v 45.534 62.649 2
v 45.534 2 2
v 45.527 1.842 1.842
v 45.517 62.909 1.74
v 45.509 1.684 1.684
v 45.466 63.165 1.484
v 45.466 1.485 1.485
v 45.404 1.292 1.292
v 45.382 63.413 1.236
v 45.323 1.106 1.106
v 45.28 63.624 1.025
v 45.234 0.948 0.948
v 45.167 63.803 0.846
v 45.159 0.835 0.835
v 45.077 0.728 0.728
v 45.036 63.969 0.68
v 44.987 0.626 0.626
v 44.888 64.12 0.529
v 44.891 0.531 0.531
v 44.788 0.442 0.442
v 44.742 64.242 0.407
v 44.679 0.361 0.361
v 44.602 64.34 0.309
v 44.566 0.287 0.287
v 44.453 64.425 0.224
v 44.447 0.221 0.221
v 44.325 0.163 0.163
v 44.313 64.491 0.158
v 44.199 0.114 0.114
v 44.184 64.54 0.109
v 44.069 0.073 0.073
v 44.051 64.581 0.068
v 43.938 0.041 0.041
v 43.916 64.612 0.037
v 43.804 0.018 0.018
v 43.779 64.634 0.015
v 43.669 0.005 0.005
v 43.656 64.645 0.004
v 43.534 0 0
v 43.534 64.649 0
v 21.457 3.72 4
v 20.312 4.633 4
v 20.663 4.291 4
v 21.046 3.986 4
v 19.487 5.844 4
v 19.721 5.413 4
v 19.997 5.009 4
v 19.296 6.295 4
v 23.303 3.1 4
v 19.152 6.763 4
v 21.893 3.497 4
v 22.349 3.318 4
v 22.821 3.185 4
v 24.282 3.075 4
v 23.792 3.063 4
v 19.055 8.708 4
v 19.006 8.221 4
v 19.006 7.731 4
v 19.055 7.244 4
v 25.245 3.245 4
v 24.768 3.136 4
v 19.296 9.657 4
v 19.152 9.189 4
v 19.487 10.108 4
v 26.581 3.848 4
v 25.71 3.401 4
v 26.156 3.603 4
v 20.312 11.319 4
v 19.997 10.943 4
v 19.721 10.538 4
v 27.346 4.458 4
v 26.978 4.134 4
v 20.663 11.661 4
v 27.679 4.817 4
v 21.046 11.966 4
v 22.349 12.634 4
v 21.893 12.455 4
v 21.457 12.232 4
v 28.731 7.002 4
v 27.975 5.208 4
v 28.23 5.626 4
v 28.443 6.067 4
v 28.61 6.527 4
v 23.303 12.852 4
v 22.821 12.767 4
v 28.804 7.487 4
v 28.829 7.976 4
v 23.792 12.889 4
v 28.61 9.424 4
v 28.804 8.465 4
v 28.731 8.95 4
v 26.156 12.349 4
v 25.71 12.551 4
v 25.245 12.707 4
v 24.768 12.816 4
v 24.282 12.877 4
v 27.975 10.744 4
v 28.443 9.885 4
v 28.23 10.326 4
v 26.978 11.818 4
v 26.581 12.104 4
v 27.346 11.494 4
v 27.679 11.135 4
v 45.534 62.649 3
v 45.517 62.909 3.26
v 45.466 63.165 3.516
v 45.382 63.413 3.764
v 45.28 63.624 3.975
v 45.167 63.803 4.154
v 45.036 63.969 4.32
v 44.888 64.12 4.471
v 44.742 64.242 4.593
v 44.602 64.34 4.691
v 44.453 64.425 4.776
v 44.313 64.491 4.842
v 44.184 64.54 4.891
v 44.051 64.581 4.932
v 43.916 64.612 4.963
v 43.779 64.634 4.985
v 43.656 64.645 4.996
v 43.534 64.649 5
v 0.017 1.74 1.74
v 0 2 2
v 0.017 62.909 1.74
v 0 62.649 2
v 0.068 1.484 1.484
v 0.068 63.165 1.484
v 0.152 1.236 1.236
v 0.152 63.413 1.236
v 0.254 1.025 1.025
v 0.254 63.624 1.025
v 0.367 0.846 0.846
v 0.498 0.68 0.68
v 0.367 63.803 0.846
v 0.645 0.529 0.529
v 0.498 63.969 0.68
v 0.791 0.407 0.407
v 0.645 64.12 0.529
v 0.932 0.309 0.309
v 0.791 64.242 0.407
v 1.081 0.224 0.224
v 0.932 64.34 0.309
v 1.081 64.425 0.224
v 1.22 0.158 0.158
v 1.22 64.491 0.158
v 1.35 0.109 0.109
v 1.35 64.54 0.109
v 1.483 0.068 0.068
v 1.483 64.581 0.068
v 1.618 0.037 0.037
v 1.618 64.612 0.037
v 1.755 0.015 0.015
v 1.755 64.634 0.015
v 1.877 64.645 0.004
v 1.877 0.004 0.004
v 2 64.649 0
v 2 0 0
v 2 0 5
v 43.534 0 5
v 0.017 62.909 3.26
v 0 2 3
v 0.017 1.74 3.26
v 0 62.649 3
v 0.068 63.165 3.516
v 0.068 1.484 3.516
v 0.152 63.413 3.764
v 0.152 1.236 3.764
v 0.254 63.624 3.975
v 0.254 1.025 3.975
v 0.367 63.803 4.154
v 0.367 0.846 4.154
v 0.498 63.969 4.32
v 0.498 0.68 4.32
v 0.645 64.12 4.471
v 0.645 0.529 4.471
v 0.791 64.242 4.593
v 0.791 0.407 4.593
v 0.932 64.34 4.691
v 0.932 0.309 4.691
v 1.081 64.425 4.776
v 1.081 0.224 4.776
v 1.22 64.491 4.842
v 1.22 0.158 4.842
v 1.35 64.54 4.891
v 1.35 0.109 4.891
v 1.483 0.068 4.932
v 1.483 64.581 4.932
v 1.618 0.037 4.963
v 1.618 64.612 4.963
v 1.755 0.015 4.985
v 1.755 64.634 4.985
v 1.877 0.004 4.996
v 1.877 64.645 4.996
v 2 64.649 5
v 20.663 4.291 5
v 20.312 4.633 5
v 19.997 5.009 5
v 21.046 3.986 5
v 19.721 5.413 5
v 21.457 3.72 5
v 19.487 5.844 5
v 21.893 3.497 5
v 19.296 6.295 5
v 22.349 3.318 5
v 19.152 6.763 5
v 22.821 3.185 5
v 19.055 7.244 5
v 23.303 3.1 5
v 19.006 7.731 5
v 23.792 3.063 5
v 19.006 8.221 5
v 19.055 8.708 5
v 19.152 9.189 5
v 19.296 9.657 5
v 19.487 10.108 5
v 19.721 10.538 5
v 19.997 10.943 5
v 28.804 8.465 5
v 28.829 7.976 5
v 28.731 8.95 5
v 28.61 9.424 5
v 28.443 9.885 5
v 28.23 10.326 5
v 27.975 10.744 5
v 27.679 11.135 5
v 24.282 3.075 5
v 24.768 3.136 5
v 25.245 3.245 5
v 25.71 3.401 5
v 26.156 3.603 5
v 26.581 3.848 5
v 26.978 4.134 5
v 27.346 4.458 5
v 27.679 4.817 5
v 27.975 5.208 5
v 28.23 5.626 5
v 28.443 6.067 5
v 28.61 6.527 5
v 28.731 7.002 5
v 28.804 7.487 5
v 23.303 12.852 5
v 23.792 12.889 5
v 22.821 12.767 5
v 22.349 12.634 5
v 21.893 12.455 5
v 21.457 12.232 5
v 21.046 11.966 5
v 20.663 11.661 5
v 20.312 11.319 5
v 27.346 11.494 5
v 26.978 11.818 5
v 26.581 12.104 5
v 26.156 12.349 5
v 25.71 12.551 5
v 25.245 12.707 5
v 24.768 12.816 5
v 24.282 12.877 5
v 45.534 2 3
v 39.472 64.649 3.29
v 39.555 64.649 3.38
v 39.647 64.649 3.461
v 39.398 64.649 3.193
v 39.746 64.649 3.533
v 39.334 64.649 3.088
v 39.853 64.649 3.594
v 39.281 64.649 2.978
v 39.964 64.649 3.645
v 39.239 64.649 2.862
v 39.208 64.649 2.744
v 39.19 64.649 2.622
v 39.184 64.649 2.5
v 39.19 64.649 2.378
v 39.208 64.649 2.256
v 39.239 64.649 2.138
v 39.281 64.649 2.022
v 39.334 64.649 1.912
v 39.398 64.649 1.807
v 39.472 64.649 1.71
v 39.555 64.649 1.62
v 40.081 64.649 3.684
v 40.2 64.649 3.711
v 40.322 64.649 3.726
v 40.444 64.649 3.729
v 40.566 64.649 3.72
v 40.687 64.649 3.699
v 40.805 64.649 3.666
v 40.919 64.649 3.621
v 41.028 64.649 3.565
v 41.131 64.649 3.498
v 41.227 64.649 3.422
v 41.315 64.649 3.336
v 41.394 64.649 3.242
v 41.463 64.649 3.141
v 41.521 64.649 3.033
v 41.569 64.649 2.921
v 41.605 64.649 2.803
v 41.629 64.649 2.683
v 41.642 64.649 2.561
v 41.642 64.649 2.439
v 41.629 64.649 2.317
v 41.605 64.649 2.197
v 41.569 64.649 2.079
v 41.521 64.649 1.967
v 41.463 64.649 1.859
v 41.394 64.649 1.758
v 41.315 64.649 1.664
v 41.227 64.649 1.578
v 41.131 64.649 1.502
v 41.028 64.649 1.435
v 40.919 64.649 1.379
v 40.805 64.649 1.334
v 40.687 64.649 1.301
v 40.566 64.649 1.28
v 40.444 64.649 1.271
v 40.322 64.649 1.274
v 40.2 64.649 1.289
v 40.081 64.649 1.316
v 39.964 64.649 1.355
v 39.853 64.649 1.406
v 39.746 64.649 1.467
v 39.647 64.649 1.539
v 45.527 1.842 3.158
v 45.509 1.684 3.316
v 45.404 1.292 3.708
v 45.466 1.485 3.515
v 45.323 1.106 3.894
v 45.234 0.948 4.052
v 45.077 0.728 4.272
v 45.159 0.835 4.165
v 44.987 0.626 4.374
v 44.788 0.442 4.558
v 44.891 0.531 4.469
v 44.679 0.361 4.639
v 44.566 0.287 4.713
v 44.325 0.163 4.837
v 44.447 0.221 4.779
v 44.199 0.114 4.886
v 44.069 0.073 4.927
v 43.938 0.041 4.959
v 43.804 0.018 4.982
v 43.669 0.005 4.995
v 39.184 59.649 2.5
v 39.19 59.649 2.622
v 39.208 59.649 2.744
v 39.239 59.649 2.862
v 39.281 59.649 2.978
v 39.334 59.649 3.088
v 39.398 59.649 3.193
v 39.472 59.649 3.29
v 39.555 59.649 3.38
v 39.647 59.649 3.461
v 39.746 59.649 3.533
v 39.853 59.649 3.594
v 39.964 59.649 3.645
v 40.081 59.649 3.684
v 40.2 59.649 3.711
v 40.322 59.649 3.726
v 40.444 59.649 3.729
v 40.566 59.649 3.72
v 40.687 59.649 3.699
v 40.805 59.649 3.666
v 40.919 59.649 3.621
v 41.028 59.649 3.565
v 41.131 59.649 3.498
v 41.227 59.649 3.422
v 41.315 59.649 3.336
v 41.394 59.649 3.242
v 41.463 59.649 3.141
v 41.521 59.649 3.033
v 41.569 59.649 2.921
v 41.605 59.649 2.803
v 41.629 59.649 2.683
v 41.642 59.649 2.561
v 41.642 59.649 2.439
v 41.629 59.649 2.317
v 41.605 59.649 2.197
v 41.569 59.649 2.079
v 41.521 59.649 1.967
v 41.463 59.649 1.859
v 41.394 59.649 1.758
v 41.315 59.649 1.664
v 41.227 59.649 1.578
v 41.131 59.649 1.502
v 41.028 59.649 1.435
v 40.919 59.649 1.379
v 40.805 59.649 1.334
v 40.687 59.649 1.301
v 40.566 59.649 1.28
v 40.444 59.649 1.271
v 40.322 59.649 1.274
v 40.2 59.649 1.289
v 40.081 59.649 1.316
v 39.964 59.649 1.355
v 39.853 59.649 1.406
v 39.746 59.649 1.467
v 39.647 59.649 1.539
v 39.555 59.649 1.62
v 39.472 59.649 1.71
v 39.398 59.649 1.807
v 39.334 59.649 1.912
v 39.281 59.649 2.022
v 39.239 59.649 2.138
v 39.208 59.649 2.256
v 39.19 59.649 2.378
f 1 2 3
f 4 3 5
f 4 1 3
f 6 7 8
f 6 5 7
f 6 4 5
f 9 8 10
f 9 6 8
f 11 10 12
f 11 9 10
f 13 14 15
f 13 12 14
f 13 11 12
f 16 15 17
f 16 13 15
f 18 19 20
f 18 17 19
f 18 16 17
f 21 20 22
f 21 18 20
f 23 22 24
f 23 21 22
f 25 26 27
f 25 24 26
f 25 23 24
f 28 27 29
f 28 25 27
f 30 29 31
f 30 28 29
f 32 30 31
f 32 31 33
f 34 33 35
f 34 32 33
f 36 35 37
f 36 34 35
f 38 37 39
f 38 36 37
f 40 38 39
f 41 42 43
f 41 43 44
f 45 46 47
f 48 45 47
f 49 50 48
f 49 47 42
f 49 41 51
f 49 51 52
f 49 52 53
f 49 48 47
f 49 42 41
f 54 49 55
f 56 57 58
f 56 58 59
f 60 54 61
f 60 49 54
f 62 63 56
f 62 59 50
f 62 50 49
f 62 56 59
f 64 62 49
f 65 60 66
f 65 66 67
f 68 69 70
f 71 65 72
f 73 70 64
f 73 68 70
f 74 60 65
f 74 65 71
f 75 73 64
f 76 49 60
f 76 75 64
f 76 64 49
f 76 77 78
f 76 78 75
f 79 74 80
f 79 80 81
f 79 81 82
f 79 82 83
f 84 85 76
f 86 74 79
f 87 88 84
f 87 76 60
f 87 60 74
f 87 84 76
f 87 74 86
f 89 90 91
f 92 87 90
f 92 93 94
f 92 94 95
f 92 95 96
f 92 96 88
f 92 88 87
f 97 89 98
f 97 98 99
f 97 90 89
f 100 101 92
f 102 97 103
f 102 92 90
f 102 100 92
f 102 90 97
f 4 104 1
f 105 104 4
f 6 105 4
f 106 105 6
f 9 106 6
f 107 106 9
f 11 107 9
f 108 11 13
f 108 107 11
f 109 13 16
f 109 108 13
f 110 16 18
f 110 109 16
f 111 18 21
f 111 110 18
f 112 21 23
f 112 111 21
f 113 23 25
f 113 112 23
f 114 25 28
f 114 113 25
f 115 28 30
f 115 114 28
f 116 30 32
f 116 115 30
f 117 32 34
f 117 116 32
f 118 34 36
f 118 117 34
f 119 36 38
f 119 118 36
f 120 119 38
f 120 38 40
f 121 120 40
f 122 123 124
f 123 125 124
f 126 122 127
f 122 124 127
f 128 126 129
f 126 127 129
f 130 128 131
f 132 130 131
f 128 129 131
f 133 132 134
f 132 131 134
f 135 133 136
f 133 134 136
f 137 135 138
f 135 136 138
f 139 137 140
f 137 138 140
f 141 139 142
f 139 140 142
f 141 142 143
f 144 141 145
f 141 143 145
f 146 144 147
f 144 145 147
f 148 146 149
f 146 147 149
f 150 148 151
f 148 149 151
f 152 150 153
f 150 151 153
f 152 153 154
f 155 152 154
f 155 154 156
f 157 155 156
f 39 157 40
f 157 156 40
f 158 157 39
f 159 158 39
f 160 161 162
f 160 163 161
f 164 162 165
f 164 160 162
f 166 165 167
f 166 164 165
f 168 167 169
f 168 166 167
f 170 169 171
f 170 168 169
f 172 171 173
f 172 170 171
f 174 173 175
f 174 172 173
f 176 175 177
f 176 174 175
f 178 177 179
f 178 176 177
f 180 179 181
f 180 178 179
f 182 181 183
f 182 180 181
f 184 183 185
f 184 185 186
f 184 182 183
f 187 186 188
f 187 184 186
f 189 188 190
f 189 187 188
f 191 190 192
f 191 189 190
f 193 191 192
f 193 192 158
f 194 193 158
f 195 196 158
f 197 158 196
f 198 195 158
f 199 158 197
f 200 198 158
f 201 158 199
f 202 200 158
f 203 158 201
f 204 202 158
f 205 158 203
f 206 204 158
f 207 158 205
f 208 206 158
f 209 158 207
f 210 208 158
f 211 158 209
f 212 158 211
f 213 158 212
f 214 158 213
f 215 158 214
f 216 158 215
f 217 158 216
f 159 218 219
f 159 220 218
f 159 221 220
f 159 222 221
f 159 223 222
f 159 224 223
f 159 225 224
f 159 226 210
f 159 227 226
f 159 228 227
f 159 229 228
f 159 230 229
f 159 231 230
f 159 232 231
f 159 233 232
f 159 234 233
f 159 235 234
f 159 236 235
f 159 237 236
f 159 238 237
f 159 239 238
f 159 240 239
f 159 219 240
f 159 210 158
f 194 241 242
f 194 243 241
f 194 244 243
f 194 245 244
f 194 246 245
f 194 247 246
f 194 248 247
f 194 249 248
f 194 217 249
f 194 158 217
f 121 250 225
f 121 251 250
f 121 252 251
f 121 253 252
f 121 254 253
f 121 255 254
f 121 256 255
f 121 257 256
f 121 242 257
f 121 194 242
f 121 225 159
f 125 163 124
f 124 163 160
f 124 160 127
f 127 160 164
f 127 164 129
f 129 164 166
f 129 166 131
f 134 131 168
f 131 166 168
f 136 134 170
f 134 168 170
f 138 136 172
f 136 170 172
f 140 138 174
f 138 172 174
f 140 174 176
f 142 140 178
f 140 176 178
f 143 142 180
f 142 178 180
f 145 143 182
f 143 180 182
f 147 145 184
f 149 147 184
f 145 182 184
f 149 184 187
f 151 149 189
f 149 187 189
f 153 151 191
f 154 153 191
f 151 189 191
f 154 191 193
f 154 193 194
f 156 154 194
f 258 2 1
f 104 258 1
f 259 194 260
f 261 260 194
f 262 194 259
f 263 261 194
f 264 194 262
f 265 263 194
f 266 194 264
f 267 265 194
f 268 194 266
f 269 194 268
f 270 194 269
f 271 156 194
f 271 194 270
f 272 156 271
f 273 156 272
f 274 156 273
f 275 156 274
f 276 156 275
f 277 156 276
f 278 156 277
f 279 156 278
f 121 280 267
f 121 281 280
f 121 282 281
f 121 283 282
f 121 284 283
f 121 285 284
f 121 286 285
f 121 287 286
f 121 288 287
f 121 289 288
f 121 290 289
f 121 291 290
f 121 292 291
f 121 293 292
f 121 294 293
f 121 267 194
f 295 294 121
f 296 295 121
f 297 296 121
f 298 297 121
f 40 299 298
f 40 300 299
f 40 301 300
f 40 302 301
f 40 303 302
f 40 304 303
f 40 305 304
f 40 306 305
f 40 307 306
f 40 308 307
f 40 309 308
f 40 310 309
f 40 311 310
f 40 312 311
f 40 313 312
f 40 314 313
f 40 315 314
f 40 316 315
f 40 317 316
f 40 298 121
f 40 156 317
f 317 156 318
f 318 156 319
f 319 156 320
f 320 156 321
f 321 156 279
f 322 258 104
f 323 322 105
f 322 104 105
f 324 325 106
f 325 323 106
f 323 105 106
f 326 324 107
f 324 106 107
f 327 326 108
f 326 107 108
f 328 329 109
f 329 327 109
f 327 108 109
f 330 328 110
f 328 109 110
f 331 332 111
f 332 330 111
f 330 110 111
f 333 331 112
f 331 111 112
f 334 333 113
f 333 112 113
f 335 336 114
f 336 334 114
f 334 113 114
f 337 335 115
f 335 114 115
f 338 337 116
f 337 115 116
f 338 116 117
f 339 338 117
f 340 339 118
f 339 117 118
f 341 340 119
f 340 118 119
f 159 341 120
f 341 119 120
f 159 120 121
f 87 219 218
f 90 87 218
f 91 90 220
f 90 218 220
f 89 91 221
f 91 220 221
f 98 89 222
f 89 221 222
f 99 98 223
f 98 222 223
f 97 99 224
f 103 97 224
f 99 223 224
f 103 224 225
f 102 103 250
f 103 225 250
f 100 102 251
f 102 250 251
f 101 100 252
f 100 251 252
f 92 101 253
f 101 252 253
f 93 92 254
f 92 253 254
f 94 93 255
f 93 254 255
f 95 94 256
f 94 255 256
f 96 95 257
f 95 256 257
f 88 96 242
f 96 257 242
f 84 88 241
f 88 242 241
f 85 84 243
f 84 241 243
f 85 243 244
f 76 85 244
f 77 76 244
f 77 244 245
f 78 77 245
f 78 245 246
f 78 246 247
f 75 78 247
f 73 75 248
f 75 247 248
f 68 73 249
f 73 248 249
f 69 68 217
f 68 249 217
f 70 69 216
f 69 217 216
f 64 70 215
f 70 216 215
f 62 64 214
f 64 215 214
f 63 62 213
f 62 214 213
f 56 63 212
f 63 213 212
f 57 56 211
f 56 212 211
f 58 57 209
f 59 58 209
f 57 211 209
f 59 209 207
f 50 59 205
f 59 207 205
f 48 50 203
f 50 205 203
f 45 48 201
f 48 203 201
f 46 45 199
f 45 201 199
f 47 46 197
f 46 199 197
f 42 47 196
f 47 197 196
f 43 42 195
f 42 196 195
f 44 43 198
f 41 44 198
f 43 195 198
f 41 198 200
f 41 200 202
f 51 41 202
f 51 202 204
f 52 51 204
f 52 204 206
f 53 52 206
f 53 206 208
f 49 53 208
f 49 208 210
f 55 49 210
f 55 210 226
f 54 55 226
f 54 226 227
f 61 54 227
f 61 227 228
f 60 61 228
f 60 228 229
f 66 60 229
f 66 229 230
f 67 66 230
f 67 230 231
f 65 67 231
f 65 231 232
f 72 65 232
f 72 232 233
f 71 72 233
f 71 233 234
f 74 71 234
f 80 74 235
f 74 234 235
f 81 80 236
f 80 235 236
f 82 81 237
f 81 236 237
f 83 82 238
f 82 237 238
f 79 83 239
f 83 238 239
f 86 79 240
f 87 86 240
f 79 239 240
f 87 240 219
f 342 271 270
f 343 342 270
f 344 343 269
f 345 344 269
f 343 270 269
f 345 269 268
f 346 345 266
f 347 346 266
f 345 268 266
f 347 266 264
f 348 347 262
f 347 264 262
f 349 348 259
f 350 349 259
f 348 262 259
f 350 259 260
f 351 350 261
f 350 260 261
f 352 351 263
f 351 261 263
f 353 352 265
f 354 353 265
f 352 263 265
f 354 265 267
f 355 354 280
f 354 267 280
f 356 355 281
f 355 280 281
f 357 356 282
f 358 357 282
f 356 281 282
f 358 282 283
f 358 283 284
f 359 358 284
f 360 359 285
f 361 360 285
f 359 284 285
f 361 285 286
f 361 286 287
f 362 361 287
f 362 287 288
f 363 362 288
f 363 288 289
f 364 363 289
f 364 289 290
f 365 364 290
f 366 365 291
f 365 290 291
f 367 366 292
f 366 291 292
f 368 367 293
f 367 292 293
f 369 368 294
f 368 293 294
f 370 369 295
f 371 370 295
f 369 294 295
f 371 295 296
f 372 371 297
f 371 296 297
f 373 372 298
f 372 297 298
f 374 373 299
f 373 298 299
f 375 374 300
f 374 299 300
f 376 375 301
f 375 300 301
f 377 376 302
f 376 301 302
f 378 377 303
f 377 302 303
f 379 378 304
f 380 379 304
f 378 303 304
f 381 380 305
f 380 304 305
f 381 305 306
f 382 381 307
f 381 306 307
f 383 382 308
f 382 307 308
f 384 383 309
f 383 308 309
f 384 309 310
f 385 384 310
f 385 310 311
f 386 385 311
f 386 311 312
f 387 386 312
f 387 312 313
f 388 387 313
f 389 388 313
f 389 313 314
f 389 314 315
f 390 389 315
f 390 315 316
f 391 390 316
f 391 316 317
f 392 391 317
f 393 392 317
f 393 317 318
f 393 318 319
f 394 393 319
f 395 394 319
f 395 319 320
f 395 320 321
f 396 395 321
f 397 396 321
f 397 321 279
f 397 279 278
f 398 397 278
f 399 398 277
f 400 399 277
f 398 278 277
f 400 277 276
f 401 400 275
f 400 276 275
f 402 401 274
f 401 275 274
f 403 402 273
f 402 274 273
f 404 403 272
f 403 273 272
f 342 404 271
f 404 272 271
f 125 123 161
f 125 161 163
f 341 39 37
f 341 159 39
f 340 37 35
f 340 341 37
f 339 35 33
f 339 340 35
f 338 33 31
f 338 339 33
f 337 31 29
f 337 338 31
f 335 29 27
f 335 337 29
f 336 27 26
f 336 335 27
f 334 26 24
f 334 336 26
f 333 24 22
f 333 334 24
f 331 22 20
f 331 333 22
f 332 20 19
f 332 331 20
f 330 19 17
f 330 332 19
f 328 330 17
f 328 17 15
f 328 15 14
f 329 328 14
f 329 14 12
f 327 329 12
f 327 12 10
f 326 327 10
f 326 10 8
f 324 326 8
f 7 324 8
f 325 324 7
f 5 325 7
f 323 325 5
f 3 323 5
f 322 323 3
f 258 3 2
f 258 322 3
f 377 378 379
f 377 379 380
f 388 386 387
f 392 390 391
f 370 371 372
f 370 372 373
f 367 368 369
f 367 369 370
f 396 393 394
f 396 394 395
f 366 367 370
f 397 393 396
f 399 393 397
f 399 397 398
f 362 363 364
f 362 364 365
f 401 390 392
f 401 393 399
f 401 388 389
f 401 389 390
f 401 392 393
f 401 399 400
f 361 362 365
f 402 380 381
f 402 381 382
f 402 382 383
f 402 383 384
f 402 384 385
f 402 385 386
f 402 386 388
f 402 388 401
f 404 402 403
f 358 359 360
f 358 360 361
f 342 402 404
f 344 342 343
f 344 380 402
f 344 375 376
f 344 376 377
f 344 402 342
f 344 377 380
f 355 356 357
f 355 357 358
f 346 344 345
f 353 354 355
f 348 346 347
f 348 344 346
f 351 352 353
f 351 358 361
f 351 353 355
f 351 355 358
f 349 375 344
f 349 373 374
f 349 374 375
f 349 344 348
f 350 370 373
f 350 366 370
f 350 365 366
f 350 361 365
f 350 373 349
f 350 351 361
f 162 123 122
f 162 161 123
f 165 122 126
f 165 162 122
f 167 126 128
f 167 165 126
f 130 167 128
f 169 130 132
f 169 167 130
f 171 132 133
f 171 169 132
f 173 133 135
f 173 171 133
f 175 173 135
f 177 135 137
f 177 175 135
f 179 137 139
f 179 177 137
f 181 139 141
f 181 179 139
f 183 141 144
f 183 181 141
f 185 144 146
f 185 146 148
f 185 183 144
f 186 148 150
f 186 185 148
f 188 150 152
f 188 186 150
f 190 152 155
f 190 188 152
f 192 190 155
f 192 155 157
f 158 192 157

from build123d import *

# Parameters (mm, degrees)
F0_W     = 45.5336533487
F0_H     = 64.6490454674
F1_DEPTH = 5
F2_R     = 2
F3_R     = 4.9143331214
F4_DEPTH = 1
F5_R     = 1.2295476181
F6_DEPTH = 5


with BuildPart() as f1:
    # F0 (on Top) → F1 (new body)
    with BuildSketch(Plane.XY):
        with Locations((22.7668266743, 32.3245227337)):
            Rectangle(F0_W, F0_H)
    extrude(amount=F1_DEPTH)

    # F2
    f2_edges = [f1.edges().sort_by_distance(p)[0] for p in [
        (0, 64.649045, 2.5),
        (0, 0, 2.5),
        (0, 32.324523, 0),
        (0, 32.324523, 5),
        (45.533653, 0, 2.5),
        (45.533653, 64.649045, 2.5),
        (45.533653, 32.324523, 0),
        (45.533653, 32.324523, 5),
    ]]
    fillet(f2_edges, radius=F2_R)

    # F3 (on face) → F4 (cut)
    with BuildSketch(Plane.XY.offset(5)):
        with Locations((23.9143331214, 7.975962013)):
            Circle(F3_R)
    extrude(amount=-F4_DEPTH, mode=Mode.SUBTRACT)

    # F5 (on face) → F6 (cut)
    with BuildSketch(Plane(origin=(0, 64.6490454674, 0), x_dir=(-1, 0, 0), z_dir=(0, 1, 0))):
        with Locations((-40.4135324061, 2.5)):
            Circle(F5_R)
    extrude(amount=-F6_DEPTH, mode=Mode.SUBTRACT)


solid = f1.part
